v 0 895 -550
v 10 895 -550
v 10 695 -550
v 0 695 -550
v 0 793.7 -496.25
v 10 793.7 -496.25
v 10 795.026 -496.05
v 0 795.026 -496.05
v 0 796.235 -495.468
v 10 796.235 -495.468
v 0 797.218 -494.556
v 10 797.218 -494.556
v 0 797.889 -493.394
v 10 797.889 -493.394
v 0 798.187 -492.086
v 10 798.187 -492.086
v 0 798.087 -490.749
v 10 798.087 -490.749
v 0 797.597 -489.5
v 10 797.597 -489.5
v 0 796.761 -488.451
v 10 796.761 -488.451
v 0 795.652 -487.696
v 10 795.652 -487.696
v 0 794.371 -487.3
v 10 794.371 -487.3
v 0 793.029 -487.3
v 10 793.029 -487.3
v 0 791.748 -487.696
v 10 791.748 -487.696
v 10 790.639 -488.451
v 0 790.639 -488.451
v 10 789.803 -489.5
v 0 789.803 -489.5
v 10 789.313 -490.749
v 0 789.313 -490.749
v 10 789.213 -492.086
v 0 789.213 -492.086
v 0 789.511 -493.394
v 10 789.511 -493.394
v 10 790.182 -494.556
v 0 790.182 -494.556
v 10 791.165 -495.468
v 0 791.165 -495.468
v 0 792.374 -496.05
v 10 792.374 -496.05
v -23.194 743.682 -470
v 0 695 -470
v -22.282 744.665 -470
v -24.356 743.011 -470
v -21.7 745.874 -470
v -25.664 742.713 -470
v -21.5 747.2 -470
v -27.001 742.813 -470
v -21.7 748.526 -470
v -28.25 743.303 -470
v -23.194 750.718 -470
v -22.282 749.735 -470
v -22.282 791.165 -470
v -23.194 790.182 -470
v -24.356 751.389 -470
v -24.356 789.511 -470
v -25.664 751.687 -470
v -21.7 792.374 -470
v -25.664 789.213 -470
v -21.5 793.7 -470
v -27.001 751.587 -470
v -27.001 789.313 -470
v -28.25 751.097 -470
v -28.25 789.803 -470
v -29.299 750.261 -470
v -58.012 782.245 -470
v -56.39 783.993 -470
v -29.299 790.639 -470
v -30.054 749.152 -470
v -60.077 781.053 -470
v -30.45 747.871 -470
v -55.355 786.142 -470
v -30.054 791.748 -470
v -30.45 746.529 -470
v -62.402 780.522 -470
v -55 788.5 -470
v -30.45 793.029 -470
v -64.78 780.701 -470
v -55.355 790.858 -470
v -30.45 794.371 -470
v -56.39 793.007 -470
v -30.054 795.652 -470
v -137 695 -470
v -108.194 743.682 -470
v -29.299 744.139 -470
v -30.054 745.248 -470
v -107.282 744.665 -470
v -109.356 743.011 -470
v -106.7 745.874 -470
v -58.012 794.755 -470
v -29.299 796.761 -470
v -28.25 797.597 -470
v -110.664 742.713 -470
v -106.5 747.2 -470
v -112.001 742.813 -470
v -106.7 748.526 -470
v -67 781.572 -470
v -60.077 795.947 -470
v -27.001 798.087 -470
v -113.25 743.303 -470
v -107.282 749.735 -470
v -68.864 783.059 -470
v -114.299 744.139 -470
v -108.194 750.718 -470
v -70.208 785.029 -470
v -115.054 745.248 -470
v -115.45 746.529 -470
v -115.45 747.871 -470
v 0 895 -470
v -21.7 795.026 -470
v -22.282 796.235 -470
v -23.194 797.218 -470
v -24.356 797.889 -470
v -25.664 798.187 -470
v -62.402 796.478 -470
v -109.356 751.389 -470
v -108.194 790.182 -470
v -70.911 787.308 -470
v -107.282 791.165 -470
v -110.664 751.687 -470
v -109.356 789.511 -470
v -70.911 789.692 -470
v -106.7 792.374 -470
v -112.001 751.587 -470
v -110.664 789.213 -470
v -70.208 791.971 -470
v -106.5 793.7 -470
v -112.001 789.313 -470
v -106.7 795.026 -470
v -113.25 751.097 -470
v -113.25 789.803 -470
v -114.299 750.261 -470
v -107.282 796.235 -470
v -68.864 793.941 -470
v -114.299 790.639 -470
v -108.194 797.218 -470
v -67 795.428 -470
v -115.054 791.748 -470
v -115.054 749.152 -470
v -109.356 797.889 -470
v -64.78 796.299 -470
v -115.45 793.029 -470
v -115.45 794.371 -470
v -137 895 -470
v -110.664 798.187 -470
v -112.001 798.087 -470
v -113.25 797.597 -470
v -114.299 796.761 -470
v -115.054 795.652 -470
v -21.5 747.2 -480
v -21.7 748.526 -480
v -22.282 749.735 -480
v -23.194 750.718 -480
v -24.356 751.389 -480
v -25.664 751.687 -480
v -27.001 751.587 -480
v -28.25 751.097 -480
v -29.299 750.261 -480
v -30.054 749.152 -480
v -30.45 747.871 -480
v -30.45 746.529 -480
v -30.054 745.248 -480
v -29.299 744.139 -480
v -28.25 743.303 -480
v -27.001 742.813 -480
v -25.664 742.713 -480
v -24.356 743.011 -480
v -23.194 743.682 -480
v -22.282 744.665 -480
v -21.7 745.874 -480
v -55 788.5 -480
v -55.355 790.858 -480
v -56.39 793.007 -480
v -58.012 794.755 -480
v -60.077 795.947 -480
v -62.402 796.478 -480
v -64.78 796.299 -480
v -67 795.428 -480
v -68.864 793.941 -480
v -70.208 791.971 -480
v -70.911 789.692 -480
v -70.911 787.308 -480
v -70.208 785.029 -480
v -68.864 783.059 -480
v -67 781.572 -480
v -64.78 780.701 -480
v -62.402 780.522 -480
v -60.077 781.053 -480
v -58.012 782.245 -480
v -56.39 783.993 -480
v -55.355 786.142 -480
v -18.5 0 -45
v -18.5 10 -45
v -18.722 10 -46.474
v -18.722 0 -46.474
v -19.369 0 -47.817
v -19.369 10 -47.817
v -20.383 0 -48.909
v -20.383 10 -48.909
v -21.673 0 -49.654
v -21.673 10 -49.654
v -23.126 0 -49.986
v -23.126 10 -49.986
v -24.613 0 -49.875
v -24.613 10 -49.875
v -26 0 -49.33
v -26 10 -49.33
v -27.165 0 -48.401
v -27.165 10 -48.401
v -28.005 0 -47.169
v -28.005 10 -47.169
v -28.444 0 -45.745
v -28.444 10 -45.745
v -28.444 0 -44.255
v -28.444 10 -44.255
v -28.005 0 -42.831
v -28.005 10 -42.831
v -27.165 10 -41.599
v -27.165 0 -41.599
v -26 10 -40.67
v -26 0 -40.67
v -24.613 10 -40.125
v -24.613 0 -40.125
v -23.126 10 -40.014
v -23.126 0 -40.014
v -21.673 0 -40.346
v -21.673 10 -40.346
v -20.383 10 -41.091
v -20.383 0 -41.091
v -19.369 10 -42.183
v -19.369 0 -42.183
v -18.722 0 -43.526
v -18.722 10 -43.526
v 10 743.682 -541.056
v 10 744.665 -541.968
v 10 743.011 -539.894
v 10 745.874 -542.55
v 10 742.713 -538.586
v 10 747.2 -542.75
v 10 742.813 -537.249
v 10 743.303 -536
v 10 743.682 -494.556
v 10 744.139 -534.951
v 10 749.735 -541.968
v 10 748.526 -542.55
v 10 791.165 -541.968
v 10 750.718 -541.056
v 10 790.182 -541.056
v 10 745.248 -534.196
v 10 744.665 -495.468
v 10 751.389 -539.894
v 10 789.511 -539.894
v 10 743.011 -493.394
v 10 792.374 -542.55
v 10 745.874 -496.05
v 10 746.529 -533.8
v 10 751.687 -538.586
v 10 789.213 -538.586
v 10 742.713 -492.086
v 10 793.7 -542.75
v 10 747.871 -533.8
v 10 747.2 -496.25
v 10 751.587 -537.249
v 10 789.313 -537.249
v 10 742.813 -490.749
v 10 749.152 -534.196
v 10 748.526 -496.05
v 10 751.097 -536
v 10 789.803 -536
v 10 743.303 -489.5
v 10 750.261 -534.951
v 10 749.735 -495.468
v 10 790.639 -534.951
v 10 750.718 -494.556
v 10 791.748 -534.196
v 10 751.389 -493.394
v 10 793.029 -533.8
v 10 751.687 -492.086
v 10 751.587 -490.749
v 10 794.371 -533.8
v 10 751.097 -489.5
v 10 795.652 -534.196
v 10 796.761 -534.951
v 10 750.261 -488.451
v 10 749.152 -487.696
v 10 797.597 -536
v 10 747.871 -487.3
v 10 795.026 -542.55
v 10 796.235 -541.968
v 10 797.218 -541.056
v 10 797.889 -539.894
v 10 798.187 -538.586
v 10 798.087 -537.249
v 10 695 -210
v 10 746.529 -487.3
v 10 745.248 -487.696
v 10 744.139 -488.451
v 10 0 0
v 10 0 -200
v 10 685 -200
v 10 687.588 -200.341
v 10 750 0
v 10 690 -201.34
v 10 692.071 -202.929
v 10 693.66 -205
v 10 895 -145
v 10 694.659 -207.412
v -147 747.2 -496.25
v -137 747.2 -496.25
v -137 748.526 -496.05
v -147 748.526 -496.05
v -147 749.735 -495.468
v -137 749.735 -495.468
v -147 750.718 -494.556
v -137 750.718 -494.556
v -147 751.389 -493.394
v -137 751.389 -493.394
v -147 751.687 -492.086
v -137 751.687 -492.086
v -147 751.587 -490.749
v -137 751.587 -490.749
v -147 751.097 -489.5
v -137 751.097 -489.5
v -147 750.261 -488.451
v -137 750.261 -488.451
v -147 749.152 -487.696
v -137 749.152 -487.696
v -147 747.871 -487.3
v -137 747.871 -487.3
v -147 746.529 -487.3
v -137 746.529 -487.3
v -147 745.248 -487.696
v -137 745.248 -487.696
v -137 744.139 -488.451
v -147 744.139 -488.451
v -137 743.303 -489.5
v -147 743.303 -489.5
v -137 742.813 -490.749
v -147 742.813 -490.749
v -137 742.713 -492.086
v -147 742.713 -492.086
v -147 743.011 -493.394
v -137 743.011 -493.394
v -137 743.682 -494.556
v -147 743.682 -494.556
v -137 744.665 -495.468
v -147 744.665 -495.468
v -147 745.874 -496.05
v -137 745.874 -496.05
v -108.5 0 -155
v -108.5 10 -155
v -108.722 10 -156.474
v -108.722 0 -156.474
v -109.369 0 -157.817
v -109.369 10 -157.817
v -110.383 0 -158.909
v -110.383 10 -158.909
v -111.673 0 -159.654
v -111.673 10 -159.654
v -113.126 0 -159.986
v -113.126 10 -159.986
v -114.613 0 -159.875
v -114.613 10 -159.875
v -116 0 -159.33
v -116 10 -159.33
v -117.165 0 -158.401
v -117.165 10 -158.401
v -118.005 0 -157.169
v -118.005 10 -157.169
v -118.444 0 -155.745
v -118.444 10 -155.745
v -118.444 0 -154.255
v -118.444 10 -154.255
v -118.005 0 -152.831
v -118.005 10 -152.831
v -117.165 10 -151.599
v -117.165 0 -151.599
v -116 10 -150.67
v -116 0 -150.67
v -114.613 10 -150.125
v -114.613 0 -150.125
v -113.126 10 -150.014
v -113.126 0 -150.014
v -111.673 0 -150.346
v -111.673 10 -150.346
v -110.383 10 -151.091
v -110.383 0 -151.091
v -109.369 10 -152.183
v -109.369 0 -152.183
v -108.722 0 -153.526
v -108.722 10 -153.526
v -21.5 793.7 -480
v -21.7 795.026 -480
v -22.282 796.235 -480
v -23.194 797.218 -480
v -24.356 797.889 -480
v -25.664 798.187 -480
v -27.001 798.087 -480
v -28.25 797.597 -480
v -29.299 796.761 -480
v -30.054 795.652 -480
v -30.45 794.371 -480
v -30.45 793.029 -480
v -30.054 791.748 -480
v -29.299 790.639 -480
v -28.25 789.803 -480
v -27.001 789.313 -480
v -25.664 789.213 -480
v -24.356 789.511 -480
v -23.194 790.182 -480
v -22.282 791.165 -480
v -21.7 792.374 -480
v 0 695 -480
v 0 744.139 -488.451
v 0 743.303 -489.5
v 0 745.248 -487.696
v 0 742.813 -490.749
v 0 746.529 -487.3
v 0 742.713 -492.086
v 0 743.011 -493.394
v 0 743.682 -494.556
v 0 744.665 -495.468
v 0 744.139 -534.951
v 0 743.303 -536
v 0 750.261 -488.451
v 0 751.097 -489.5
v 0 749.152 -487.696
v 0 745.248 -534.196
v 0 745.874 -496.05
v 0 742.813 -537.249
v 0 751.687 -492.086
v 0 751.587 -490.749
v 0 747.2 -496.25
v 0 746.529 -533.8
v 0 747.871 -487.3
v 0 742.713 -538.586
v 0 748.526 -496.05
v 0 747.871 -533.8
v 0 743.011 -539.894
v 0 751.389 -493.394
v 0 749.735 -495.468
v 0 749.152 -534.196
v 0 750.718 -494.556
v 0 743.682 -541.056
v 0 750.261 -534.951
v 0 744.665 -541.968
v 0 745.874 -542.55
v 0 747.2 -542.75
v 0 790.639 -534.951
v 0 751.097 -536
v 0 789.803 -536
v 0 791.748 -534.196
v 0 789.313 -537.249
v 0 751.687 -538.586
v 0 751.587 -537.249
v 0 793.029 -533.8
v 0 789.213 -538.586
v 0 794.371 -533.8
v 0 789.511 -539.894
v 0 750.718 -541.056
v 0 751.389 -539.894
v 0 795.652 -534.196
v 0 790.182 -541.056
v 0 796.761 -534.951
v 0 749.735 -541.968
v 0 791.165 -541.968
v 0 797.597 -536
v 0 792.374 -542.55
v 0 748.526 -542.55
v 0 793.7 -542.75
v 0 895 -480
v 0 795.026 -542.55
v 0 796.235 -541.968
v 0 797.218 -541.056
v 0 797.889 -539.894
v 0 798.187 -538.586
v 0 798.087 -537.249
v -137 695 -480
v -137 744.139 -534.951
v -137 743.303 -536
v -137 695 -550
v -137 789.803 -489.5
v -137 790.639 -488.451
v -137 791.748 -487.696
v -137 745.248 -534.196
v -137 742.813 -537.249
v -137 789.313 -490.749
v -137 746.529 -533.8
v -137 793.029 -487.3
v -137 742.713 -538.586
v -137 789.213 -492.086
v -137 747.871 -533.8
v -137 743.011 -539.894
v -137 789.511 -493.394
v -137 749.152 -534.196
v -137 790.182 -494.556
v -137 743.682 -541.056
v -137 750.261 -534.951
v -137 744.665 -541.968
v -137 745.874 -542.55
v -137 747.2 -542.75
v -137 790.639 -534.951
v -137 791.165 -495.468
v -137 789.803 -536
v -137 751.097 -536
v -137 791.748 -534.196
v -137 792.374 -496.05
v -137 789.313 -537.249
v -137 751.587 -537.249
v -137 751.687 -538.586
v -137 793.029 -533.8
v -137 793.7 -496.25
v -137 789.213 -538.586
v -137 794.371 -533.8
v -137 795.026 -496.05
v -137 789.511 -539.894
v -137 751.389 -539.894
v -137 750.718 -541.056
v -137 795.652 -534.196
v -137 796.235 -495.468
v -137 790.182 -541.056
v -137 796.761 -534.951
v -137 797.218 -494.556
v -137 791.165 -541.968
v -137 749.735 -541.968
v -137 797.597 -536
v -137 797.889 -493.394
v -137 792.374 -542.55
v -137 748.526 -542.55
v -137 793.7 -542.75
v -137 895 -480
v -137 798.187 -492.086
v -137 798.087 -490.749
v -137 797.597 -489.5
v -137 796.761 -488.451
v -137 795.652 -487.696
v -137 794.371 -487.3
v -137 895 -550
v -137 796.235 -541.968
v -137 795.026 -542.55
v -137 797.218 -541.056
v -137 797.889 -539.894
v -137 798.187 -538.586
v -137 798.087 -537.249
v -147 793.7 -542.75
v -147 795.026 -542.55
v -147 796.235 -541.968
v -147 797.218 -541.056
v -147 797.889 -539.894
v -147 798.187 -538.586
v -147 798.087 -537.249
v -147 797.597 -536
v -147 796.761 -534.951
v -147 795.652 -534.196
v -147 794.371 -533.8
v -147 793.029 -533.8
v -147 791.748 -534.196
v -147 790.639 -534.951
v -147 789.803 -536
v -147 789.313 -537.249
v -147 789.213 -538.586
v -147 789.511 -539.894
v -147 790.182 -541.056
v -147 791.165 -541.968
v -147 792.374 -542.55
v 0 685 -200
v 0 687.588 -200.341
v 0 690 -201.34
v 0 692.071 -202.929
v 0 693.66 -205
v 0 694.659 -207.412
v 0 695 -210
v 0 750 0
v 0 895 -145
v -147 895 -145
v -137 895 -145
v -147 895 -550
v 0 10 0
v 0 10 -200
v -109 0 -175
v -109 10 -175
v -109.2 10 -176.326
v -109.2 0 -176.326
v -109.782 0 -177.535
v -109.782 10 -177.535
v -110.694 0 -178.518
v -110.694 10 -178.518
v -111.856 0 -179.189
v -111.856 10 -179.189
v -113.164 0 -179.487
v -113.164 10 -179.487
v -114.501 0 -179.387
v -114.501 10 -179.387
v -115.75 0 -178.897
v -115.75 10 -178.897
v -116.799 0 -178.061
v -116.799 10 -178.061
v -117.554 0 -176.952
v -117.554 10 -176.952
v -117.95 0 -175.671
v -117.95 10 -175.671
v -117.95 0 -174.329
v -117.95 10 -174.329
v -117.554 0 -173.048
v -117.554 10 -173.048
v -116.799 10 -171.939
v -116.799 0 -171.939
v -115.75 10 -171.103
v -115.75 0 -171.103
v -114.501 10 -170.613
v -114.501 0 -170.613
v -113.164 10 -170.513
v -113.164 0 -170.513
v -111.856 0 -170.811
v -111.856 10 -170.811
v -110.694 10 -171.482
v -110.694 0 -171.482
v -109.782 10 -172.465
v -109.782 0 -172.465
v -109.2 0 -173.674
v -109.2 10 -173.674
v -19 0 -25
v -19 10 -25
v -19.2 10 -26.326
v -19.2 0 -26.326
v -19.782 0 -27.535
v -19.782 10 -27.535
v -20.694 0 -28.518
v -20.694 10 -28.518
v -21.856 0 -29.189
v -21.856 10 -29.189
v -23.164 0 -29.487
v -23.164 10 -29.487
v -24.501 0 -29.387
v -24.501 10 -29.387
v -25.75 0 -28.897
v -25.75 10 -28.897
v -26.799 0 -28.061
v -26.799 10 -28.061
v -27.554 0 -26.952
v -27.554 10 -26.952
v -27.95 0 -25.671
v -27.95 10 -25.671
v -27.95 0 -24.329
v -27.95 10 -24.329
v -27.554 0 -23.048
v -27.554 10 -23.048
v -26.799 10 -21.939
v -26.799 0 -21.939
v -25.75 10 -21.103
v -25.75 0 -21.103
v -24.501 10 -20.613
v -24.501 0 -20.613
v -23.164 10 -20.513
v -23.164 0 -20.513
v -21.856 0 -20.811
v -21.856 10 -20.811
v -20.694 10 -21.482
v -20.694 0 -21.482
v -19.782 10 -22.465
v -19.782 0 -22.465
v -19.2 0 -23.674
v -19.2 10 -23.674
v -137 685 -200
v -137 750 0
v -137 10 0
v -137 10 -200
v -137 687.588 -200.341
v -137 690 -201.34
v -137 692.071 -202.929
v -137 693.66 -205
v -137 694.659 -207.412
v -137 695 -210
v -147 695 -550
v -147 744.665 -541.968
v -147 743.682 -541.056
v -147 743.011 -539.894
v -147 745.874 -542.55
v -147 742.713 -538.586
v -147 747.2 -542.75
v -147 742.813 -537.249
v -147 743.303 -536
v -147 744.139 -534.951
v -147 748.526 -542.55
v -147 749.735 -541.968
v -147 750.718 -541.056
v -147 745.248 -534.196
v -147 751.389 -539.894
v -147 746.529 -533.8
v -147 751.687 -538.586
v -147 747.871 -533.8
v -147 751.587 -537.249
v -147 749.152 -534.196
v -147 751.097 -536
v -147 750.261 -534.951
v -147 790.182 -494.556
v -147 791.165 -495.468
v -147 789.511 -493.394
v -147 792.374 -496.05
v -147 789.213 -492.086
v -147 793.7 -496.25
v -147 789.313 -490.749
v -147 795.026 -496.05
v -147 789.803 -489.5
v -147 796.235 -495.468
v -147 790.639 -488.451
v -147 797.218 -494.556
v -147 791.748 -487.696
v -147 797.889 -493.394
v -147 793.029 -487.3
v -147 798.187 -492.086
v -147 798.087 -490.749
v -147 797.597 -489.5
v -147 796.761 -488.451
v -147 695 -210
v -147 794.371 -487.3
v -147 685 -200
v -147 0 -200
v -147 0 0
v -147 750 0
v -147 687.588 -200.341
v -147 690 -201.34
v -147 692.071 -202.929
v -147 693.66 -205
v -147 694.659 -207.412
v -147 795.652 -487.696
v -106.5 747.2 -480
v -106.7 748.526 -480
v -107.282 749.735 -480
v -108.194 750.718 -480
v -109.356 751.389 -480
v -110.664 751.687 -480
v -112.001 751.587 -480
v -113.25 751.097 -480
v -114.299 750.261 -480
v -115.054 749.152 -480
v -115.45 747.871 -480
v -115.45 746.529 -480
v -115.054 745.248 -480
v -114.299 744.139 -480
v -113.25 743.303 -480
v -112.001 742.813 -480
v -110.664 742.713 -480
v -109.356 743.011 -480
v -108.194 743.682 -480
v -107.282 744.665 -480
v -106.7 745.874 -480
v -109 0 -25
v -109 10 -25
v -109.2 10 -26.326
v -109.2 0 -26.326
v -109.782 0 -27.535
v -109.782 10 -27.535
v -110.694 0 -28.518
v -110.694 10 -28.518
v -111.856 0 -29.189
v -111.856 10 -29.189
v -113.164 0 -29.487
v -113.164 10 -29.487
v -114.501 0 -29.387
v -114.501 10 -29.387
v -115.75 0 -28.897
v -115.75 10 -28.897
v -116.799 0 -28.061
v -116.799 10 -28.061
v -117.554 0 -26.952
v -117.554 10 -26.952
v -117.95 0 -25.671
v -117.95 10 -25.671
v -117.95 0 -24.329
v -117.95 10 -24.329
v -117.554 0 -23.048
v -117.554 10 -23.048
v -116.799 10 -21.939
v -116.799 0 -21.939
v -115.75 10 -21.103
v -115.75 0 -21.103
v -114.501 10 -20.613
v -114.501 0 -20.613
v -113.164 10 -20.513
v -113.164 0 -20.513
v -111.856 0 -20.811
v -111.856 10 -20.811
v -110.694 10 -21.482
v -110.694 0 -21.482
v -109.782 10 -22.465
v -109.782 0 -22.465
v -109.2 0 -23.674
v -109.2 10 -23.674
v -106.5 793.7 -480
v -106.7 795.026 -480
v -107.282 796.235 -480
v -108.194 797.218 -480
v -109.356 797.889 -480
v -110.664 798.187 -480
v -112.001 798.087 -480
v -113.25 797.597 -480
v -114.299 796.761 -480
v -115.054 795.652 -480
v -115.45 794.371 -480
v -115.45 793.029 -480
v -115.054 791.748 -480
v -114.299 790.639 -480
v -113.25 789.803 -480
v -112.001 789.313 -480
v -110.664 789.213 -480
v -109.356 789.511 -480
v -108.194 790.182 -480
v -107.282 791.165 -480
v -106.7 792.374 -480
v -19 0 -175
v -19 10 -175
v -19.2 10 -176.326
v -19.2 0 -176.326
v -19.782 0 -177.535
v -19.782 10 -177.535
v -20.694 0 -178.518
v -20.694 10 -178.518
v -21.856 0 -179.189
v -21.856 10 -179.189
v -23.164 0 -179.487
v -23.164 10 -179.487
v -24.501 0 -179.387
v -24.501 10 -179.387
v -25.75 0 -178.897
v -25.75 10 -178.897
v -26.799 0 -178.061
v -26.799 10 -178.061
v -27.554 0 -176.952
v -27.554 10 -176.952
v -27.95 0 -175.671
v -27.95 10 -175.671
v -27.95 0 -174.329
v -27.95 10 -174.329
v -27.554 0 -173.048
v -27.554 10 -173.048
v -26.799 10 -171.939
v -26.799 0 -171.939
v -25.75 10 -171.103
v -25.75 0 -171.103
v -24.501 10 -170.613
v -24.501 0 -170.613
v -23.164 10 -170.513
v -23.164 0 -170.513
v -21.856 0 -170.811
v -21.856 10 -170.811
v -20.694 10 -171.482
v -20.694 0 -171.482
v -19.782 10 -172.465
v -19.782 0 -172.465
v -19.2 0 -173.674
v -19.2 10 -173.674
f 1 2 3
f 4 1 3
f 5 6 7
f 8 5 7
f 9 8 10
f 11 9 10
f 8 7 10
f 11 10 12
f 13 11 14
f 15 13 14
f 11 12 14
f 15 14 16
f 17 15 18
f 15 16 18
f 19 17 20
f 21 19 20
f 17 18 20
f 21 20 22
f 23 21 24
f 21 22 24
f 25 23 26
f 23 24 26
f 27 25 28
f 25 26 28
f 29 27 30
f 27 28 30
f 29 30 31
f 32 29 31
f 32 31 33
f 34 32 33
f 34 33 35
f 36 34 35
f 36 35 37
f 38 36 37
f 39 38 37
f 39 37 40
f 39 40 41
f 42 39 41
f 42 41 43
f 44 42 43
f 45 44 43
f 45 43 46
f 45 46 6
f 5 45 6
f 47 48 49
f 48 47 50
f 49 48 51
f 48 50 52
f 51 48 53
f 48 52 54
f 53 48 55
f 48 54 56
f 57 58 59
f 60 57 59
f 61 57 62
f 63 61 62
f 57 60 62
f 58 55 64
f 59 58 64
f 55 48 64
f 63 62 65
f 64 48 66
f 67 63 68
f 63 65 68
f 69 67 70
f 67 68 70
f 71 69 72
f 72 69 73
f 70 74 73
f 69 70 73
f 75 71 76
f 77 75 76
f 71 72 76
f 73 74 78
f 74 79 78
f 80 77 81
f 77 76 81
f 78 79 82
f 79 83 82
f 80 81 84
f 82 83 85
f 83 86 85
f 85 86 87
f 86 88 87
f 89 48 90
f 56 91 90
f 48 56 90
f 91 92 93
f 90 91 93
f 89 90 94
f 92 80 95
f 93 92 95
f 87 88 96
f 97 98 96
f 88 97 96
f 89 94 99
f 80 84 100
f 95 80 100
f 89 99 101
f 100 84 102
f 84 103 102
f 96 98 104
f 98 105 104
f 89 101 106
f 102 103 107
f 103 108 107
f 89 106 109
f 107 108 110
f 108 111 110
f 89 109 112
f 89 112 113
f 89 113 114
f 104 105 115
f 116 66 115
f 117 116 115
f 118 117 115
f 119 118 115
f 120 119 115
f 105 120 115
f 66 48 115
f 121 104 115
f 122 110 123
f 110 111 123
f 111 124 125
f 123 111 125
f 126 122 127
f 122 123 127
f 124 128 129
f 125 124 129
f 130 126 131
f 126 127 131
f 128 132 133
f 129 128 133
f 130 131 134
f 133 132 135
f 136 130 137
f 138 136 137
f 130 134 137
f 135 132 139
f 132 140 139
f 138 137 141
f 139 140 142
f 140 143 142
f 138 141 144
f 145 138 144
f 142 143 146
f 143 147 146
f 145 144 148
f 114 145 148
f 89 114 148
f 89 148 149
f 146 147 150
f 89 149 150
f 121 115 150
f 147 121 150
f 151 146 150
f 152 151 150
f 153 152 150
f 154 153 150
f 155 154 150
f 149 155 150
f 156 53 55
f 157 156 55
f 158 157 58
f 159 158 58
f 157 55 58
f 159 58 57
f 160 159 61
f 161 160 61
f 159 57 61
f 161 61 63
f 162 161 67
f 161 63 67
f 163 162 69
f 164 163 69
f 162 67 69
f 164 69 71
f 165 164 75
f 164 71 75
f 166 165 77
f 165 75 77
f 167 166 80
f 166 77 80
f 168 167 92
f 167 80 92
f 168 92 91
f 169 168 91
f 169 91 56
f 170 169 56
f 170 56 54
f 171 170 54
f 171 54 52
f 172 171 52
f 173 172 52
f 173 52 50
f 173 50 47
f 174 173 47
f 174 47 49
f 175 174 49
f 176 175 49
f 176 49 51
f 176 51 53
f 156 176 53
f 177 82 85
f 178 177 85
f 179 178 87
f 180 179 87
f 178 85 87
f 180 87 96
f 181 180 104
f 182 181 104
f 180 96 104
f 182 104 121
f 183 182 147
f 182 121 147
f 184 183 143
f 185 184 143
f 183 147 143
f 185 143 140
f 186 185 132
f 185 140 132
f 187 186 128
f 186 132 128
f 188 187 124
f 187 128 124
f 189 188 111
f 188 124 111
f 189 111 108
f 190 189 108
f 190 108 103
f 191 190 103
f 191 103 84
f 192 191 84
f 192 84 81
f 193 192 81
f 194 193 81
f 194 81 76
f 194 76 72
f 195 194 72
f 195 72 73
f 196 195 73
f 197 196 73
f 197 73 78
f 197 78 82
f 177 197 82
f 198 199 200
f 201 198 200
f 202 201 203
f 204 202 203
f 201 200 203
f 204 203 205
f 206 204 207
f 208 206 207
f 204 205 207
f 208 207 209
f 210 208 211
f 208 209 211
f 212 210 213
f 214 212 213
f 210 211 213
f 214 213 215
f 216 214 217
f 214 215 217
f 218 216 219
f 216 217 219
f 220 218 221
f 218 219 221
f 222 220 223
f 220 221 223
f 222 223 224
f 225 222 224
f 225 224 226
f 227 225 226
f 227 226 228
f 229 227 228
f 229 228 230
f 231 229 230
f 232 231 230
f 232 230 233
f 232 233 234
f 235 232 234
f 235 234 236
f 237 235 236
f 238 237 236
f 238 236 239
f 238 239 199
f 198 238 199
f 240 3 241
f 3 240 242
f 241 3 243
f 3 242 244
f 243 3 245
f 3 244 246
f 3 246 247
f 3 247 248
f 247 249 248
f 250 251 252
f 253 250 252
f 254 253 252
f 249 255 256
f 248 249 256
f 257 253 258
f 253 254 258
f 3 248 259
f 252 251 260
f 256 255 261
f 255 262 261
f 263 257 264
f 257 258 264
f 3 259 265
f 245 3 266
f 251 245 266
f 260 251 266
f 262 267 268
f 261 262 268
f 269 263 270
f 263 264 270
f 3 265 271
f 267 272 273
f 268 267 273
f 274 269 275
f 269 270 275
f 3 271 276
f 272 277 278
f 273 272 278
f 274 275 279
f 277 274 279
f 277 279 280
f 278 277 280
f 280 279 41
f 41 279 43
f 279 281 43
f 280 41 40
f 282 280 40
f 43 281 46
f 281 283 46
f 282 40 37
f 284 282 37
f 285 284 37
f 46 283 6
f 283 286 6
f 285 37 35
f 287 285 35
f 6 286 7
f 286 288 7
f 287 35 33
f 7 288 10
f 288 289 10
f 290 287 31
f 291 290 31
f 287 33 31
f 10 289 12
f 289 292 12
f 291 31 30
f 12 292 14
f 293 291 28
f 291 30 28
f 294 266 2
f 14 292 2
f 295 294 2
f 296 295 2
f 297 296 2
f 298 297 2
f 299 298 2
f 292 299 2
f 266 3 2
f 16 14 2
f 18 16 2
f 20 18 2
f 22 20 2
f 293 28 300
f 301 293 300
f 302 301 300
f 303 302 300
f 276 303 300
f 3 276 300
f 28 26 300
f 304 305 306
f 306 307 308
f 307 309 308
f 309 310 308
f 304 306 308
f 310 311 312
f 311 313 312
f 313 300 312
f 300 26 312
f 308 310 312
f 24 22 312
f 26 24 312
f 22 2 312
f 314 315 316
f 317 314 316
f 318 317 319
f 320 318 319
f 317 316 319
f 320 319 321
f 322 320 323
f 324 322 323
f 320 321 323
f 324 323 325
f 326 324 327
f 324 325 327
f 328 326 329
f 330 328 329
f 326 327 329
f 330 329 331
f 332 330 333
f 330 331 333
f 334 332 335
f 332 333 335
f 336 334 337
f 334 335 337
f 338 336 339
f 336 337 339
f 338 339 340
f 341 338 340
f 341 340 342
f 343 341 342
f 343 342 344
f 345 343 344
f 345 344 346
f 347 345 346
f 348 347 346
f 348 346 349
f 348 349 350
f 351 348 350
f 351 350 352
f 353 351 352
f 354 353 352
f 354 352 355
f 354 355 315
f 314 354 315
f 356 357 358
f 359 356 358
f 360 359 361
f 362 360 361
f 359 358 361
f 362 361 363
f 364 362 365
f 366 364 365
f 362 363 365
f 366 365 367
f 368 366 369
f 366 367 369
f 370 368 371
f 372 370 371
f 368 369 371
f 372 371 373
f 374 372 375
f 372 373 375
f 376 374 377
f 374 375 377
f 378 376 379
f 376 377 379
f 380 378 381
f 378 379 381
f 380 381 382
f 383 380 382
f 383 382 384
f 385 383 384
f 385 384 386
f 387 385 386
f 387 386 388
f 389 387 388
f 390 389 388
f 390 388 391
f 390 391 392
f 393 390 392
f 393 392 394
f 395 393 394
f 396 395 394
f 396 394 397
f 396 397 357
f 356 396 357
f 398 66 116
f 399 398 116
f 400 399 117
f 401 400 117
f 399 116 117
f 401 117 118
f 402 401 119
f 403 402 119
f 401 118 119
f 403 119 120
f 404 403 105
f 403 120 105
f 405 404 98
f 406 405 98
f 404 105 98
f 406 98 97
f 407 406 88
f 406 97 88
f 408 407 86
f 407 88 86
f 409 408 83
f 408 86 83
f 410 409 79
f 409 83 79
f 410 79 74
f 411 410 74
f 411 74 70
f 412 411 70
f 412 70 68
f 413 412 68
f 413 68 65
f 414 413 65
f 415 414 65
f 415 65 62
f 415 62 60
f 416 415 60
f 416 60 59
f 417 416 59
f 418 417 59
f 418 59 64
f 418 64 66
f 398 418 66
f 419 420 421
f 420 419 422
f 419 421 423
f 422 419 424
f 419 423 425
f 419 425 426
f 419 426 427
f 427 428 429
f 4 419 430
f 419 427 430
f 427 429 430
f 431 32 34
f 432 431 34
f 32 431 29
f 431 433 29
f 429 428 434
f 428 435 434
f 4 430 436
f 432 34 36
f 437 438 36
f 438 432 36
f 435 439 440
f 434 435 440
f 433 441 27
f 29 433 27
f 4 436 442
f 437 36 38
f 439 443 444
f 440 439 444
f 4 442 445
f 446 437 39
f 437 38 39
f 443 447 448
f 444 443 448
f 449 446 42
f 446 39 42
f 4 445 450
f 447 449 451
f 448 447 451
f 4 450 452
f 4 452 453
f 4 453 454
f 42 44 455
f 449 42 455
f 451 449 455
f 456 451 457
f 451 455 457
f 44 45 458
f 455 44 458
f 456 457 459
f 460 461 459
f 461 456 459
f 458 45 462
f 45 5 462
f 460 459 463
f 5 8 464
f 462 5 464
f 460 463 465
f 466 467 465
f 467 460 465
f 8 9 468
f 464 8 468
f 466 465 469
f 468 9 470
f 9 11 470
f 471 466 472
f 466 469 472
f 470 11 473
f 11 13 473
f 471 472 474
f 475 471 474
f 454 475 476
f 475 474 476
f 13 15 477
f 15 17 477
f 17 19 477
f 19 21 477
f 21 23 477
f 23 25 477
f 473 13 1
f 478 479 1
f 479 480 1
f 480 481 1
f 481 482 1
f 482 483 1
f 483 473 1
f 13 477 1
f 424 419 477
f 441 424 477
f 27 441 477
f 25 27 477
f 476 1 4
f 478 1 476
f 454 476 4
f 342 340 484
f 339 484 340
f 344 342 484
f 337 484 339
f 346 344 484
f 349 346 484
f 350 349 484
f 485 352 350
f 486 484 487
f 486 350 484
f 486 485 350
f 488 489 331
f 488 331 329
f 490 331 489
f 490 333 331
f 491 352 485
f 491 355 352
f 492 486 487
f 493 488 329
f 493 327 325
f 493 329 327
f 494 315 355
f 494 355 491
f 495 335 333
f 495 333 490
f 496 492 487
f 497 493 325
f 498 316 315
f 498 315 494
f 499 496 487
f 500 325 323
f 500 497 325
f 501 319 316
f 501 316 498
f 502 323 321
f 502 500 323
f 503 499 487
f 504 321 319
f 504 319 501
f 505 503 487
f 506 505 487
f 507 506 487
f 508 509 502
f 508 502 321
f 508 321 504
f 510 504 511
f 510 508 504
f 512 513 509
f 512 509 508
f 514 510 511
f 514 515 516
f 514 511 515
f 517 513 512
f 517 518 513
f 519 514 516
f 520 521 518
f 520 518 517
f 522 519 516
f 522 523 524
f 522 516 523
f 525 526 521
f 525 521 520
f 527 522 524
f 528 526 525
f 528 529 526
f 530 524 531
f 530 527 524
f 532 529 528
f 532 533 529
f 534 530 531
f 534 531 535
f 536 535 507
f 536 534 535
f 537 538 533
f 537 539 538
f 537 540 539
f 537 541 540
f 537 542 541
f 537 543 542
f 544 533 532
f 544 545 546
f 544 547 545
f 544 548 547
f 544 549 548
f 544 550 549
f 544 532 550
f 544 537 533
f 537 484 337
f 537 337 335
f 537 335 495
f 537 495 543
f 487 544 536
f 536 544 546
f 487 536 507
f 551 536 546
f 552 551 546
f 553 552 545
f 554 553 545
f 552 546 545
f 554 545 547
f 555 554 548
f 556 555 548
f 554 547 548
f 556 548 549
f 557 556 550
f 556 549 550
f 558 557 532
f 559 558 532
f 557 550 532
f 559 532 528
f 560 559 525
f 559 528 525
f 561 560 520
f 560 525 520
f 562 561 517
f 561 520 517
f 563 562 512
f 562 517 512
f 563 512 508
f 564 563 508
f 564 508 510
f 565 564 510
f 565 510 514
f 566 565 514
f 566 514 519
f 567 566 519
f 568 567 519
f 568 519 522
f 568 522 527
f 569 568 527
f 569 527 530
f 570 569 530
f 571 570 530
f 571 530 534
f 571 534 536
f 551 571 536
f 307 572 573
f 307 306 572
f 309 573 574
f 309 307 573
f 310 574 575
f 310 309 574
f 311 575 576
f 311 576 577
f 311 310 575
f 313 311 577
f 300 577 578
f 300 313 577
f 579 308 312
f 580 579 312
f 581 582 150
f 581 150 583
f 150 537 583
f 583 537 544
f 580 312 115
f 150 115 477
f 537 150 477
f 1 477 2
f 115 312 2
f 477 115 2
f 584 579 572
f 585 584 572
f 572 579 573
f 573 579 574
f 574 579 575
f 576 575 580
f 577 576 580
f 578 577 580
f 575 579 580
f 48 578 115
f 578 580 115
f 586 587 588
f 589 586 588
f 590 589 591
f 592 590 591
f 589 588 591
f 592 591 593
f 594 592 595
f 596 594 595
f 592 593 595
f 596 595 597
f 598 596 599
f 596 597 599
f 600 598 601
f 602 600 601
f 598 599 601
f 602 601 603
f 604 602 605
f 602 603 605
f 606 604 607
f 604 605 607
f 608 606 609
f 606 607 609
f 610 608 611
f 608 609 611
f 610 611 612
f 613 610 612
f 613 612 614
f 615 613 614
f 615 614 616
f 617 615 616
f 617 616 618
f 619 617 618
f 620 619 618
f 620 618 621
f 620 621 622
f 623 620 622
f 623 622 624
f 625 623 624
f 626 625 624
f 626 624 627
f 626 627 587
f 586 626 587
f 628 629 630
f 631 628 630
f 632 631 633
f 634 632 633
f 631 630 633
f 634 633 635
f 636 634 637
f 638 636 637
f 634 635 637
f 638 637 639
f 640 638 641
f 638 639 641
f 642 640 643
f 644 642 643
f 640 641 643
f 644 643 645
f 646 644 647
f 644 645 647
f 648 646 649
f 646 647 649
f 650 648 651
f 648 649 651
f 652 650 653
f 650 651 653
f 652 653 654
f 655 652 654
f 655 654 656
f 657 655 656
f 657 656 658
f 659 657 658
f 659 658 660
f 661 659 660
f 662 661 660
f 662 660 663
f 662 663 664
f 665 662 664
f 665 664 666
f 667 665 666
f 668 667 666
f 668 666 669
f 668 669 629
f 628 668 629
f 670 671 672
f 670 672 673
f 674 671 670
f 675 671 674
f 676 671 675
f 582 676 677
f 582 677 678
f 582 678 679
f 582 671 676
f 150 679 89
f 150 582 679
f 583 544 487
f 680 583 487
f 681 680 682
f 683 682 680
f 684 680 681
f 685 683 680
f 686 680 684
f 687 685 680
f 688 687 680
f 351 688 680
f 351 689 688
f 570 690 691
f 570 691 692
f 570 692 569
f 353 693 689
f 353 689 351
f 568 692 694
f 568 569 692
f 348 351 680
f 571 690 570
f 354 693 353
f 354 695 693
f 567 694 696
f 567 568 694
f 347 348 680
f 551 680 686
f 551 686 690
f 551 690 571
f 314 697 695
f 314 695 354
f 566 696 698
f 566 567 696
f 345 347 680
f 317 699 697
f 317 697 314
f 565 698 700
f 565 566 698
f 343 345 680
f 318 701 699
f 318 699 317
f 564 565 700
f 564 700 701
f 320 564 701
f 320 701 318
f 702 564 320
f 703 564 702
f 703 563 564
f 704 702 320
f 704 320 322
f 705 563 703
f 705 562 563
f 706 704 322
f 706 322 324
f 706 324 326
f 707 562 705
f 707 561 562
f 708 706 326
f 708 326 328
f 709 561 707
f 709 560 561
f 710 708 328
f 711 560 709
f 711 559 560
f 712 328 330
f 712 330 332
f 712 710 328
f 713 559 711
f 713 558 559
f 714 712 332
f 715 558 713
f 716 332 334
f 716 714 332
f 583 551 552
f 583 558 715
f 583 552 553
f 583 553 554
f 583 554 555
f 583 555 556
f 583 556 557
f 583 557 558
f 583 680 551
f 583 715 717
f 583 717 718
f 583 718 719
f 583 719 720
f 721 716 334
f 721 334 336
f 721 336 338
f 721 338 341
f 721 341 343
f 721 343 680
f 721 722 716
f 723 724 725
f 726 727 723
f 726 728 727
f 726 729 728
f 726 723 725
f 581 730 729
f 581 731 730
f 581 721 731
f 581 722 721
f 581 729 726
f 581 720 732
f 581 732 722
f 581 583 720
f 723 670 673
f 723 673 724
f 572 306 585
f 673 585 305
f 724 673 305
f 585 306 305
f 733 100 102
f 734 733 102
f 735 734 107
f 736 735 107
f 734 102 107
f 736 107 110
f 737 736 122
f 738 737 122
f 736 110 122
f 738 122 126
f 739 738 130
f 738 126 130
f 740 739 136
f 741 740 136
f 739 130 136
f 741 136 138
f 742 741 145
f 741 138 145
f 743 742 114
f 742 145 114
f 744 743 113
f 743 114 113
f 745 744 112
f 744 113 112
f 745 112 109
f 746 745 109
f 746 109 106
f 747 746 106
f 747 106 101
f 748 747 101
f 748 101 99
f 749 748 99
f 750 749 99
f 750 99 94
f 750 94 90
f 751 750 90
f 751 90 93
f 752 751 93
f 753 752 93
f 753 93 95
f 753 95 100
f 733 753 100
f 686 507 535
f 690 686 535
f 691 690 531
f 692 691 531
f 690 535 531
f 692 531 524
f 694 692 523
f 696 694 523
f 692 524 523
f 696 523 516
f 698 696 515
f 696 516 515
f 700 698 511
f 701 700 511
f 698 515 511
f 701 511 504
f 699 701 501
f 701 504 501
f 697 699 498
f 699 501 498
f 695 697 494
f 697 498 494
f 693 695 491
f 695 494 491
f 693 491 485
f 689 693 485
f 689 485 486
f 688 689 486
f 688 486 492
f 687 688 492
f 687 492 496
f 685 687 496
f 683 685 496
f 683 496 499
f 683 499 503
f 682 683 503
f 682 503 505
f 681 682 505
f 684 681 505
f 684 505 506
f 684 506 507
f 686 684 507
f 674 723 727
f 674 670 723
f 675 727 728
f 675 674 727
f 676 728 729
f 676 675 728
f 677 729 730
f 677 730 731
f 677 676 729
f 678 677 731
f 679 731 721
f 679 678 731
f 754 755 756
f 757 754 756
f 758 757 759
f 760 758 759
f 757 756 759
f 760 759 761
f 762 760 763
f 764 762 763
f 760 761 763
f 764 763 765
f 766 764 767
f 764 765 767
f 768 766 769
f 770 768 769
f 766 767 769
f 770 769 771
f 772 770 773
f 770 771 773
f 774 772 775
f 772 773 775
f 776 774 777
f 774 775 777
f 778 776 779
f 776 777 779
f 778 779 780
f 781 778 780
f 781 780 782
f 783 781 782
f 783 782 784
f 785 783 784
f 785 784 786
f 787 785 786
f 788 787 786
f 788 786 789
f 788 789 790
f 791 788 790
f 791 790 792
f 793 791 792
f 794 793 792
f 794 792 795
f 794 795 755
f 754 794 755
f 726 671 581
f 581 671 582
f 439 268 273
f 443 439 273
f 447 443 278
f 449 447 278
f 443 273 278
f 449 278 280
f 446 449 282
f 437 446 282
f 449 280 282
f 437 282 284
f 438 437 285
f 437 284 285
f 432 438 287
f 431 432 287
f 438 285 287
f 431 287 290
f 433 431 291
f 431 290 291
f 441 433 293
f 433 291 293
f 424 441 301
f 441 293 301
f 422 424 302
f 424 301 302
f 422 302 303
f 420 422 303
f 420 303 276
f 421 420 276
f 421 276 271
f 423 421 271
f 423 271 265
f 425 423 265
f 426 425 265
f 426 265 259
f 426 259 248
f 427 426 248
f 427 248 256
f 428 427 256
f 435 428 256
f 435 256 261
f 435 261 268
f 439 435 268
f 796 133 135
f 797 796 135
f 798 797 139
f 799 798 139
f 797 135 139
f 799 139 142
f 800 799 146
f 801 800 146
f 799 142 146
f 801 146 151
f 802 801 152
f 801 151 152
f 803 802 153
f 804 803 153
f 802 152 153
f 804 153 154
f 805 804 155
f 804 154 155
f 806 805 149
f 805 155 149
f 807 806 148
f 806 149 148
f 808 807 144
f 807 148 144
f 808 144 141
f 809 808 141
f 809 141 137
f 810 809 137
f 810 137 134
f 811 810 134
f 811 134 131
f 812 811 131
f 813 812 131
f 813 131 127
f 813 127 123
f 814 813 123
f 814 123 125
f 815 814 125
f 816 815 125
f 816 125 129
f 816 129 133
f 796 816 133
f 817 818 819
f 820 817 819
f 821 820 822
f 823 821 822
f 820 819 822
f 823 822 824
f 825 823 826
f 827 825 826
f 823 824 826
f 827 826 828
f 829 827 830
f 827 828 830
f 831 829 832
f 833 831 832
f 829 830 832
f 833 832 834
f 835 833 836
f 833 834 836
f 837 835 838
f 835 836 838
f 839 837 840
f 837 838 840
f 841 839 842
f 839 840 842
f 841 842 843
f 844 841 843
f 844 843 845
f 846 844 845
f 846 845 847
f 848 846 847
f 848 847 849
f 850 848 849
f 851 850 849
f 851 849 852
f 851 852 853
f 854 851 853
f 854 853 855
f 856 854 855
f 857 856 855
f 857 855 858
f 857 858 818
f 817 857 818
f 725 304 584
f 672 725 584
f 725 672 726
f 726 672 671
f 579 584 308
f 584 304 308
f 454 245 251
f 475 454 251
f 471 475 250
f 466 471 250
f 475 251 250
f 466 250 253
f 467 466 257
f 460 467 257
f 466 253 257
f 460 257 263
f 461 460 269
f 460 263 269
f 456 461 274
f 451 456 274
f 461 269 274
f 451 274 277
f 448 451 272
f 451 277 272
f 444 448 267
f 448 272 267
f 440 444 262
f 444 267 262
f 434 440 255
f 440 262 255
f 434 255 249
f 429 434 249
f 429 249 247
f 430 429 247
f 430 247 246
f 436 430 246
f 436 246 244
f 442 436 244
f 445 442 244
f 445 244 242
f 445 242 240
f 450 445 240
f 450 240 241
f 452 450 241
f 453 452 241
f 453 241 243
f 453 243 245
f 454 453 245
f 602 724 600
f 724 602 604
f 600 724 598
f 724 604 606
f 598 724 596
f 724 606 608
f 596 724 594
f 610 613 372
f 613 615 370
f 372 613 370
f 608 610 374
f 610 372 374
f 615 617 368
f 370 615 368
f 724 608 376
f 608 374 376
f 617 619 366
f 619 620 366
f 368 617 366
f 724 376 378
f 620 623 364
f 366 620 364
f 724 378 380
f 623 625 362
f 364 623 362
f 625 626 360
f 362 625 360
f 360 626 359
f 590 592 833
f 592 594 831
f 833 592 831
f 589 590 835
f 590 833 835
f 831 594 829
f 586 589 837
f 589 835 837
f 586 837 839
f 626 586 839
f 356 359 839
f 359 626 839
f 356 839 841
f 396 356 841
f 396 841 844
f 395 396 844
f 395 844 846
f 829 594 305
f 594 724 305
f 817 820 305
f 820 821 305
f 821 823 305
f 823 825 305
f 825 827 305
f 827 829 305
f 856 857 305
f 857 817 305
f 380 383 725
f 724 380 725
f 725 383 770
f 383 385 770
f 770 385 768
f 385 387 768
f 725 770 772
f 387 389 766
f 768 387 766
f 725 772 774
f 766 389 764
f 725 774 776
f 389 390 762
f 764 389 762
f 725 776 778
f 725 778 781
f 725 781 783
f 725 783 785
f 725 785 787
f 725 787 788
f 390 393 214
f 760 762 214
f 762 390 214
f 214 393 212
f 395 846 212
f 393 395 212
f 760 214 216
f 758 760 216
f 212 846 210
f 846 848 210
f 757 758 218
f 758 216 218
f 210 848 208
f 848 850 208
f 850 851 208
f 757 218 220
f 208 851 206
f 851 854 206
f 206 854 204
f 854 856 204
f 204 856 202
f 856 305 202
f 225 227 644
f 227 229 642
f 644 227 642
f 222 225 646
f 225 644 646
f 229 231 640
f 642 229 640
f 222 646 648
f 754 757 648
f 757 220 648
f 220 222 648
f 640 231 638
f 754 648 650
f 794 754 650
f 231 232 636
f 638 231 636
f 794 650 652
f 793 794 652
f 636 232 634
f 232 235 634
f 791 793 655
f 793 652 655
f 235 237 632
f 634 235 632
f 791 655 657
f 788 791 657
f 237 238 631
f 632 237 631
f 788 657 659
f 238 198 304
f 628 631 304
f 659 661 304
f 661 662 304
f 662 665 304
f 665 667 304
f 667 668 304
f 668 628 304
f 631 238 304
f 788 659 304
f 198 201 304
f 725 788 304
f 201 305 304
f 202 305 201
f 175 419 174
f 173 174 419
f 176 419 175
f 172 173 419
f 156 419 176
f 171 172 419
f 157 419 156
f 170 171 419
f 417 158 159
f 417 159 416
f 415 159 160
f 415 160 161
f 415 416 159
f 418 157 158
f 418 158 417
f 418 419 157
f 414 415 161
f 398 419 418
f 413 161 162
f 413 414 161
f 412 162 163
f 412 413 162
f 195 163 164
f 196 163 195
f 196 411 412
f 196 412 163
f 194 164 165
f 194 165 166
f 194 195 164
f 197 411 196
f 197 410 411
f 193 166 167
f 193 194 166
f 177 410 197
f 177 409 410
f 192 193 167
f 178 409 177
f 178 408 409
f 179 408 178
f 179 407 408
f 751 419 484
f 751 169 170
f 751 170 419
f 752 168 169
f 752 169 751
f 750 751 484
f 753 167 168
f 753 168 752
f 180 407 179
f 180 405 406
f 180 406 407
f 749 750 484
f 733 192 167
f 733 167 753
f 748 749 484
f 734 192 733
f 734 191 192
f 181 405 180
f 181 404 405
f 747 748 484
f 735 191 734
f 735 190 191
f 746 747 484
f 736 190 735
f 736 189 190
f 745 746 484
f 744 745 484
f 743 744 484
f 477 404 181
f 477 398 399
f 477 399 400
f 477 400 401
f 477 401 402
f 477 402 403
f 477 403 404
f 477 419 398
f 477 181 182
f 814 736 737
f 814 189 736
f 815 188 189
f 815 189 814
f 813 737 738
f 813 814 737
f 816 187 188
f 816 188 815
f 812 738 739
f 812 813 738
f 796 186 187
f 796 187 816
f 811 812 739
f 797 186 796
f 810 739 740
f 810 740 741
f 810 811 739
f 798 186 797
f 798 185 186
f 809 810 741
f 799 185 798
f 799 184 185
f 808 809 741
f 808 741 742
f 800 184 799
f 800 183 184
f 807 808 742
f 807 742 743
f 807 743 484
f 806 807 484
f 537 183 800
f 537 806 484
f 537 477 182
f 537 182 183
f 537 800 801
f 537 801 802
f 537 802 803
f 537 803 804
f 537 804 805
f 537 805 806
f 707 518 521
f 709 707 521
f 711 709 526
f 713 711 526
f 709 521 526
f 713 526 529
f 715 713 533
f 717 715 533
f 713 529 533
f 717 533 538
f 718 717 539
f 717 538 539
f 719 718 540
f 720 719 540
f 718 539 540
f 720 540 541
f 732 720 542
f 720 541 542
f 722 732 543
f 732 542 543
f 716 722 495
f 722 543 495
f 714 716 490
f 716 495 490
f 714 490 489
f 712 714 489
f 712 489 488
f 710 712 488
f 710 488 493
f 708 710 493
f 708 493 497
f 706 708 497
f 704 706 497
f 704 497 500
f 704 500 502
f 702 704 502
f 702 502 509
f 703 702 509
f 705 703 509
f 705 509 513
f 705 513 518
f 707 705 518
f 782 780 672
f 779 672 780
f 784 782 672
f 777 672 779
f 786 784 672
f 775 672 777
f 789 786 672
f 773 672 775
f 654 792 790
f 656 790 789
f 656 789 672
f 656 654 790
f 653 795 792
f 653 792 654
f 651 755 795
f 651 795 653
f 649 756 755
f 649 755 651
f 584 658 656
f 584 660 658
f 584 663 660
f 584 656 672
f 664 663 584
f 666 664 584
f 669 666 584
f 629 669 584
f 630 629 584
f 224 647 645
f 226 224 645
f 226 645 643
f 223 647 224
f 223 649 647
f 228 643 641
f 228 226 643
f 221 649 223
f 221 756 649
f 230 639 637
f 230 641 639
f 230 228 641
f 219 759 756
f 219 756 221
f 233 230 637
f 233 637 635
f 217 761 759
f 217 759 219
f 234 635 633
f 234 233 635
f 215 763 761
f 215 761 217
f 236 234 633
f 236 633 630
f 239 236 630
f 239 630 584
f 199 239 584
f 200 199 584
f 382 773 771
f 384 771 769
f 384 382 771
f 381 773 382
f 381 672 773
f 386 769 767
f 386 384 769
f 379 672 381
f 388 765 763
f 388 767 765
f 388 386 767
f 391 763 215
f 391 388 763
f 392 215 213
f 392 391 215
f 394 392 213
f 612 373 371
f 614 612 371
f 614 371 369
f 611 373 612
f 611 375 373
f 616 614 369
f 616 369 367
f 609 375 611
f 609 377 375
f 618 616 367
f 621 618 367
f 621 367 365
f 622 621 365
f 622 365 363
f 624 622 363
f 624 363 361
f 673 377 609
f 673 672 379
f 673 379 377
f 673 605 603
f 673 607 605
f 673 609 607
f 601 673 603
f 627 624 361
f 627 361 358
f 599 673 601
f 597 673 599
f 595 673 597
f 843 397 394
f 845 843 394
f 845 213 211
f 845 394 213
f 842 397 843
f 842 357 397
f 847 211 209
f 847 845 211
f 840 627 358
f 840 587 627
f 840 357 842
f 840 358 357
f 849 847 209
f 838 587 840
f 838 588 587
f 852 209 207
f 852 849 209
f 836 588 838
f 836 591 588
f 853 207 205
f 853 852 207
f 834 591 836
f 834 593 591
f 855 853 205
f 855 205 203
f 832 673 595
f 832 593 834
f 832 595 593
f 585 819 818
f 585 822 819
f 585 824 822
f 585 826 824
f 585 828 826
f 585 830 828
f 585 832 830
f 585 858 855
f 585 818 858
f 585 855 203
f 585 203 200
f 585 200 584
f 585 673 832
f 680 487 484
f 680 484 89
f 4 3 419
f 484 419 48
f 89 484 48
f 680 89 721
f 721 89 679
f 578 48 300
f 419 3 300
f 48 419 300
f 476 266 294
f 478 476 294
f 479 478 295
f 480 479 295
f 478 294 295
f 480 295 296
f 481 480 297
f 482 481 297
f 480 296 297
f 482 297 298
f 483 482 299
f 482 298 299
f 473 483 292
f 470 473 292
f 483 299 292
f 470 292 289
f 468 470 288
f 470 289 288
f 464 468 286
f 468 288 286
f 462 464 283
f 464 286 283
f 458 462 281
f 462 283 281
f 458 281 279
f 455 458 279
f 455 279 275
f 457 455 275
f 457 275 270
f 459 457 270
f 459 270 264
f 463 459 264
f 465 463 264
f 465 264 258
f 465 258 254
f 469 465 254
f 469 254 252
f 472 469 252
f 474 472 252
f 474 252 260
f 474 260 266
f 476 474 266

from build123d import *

# Parameters (mm, degrees)
BOSS_EXTRUDE1_DEPTH      = 10
BOSS_EXTRUDE1_DEPTH_BACK = 147
SKETCH3_W                = 137
SKETCH3_H                = 550
CUT_EXTRUDE1_DEPTH       = 885
SKETCH4_W                = 137
SKETCH4_H                = 200
BOSS_EXTRUDE2_DEPTH      = 10
SKETCH5_R                = 4.5
CUT_EXTRUDE2_DEPTH       = 158
CUT_EXTRUDE3_REACH       = 82
SKETCH6_R                = 4.5
SKETCH6_R_2              = 8
CUT_EXTRUDE4_REACH       = 12
SKETCH7_R                = 4.5
SKETCH7_R_2              = 5
FILLET1_R                = 10


with BuildPart() as part:
    # Sketch1 → Boss-Extrude1 (new body, two sides)
    with BuildSketch(Plane(origin=(0, 0, 0), x_dir=(0, 0, -1), z_dir=(1, 0, 0))) as boss_extrude1_sk:
        Polygon((0, 0), (0, 750), (145, 895), (550, 895), (550, 695), (200, 695), (200, 0), align=None)
    extrude(amount=BOSS_EXTRUDE1_DEPTH)
    extrude(boss_extrude1_sk.sketch, amount=-BOSS_EXTRUDE1_DEPTH_BACK)

    # Sketch3 → Cut-Extrude1 (cut)
    with BuildSketch(Plane(origin=(0, 895, 0), x_dir=(1, 0, 0), z_dir=(0, 1, 0))):
        with Locations((-68.5, 275)):
            Rectangle(SKETCH3_W, SKETCH3_H)
    extrude(amount=-CUT_EXTRUDE1_DEPTH, mode=Mode.SUBTRACT)

    # Sketch4 → Boss-Extrude2 (add)
    with BuildSketch(Plane(origin=(0, 0, -480), x_dir=(-1, 0, 0), z_dir=(0, 0, -1))):
        with Locations((68.5, 795)):
            Rectangle(SKETCH4_W, SKETCH4_H)
    extrude(amount=-BOSS_EXTRUDE2_DEPTH)

    # Sketch5 → Cut-Extrude2 (cut, through all)
    with BuildSketch(Plane(origin=(10, 0, 0), x_dir=(0, 0, -1), z_dir=(1, 0, 0))):
        with Locations((538.25, 747.2)):
            Circle(SKETCH5_R)
        with Locations((538.25, 793.7)):
            Circle(SKETCH5_R)
        with Locations((491.75, 747.2)):
            Circle(SKETCH5_R)
        with Locations((491.75, 793.7)):
            Circle(SKETCH5_R)
    extrude(amount=-CUT_EXTRUDE2_DEPTH, mode=Mode.SUBTRACT)

    # Sketch6 → Cut-Extrude3 (cut, up to next)
    with BuildSketch(Plane.XY.offset(-470), mode=Mode.PRIVATE) as cut_extrude3_sk1:
        with Locations((-111, 747.2)):
            Circle(SKETCH6_R)
    cut_extrude3_tool1 = extrude(cut_extrude3_sk1.sketch, amount=-CUT_EXTRUDE3_REACH, mode=Mode.PRIVATE) & part.part
    add(cut_extrude3_tool1.solids().sort_by_distance((-111, 747.2, -470))[0], mode=Mode.SUBTRACT)
    # Sketch6 → Cut-Extrude3 (cut, up to next)
    with BuildSketch(Plane.XY.offset(-470), mode=Mode.PRIVATE) as cut_extrude3_sk2:
        with Locations((-26, 747.2)):
            Circle(SKETCH6_R)
    cut_extrude3_tool2 = extrude(cut_extrude3_sk2.sketch, amount=-CUT_EXTRUDE3_REACH, mode=Mode.PRIVATE) & part.part
    add(cut_extrude3_tool2.solids().sort_by_distance((-26, 747.2, -470))[0], mode=Mode.SUBTRACT)
    # Sketch6 → Cut-Extrude3 (cut, up to next)
    with BuildSketch(Plane.XY.offset(-470), mode=Mode.PRIVATE) as cut_extrude3_sk3:
        with Locations((-111, 793.7)):
            Circle(SKETCH6_R)
    cut_extrude3_tool3 = extrude(cut_extrude3_sk3.sketch, amount=-CUT_EXTRUDE3_REACH, mode=Mode.PRIVATE) & part.part
    add(cut_extrude3_tool3.solids().sort_by_distance((-111, 793.7, -470))[0], mode=Mode.SUBTRACT)
    # Sketch6 → Cut-Extrude3 (cut, up to next)
    with BuildSketch(Plane.XY.offset(-470), mode=Mode.PRIVATE) as cut_extrude3_sk4:
        with Locations((-26, 793.7)):
            Circle(SKETCH6_R)
    cut_extrude3_tool4 = extrude(cut_extrude3_sk4.sketch, amount=-CUT_EXTRUDE3_REACH, mode=Mode.PRIVATE) & part.part
    add(cut_extrude3_tool4.solids().sort_by_distance((-26, 793.7, -470))[0], mode=Mode.SUBTRACT)
    # Sketch6 → Cut-Extrude3 (cut, up to next)
    with BuildSketch(Plane.XY.offset(-470), mode=Mode.PRIVATE) as cut_extrude3_sk5:
        with Locations((-63, 788.5)):
            Circle(SKETCH6_R_2)
    cut_extrude3_tool5 = extrude(cut_extrude3_sk5.sketch, amount=-CUT_EXTRUDE3_REACH, mode=Mode.PRIVATE) & part.part
    add(cut_extrude3_tool5.solids().sort_by_distance((-63, 788.5, -470))[0], mode=Mode.SUBTRACT)

    # Sketch7 → Cut-Extrude4 (cut, up to next)
    with BuildSketch(Plane(origin=(0, 10, 0), x_dir=(1, 0, 0), z_dir=(0, 1, 0)), mode=Mode.PRIVATE) as cut_extrude4_sk1:
        with Locations((-113.5, 175)):
            Circle(SKETCH7_R)
    cut_extrude4_tool1 = extrude(cut_extrude4_sk1.sketch, amount=-CUT_EXTRUDE4_REACH, mode=Mode.PRIVATE) & part.part
    add(cut_extrude4_tool1.solids().sort_by_distance((-113.5, 10, -175))[0], mode=Mode.SUBTRACT)
    # Sketch7 → Cut-Extrude4 (cut, up to next)
    with BuildSketch(Plane(origin=(0, 10, 0), x_dir=(1, 0, 0), z_dir=(0, 1, 0)), mode=Mode.PRIVATE) as cut_extrude4_sk2:
        with Locations((-23.5, 175)):
            Circle(SKETCH7_R)
    cut_extrude4_tool2 = extrude(cut_extrude4_sk2.sketch, amount=-CUT_EXTRUDE4_REACH, mode=Mode.PRIVATE) & part.part
    add(cut_extrude4_tool2.solids().sort_by_distance((-23.5, 10, -175))[0], mode=Mode.SUBTRACT)
    # Sketch7 → Cut-Extrude4 (cut, up to next)
    with BuildSketch(Plane(origin=(0, 10, 0), x_dir=(1, 0, 0), z_dir=(0, 1, 0)), mode=Mode.PRIVATE) as cut_extrude4_sk3:
        with Locations((-23.5, 25)):
            Circle(SKETCH7_R)
    cut_extrude4_tool3 = extrude(cut_extrude4_sk3.sketch, amount=-CUT_EXTRUDE4_REACH, mode=Mode.PRIVATE) & part.part
    add(cut_extrude4_tool3.solids().sort_by_distance((-23.5, 10, -25))[0], mode=Mode.SUBTRACT)
    # Sketch7 → Cut-Extrude4 (cut, up to next)
    with BuildSketch(Plane(origin=(0, 10, 0), x_dir=(1, 0, 0), z_dir=(0, 1, 0)), mode=Mode.PRIVATE) as cut_extrude4_sk4:
        with Locations((-113.5, 25)):
            Circle(SKETCH7_R)
    cut_extrude4_tool4 = extrude(cut_extrude4_sk4.sketch, amount=-CUT_EXTRUDE4_REACH, mode=Mode.PRIVATE) & part.part
    add(cut_extrude4_tool4.solids().sort_by_distance((-113.5, 10, -25))[0], mode=Mode.SUBTRACT)
    # Sketch7 → Cut-Extrude4 (cut, up to next)
    with BuildSketch(Plane(origin=(0, 10, 0), x_dir=(1, 0, 0), z_dir=(0, 1, 0)), mode=Mode.PRIVATE) as cut_extrude4_sk5:
        with Locations((-113.5, 155)):
            Circle(SKETCH7_R_2)
    cut_extrude4_tool5 = extrude(cut_extrude4_sk5.sketch, amount=-CUT_EXTRUDE4_REACH, mode=Mode.PRIVATE) & part.part
    add(cut_extrude4_tool5.solids().sort_by_distance((-113.5, 10, -155))[0], mode=Mode.SUBTRACT)
    # Sketch7 → Cut-Extrude4 (cut, up to next)
    with BuildSketch(Plane(origin=(0, 10, 0), x_dir=(1, 0, 0), z_dir=(0, 1, 0)), mode=Mode.PRIVATE) as cut_extrude4_sk6:
        with Locations((-23.5, 45)):
            Circle(SKETCH7_R_2)
    cut_extrude4_tool6 = extrude(cut_extrude4_sk6.sketch, amount=-CUT_EXTRUDE4_REACH, mode=Mode.PRIVATE) & part.part
    add(cut_extrude4_tool6.solids().sort_by_distance((-23.5, 10, -45))[0], mode=Mode.SUBTRACT)

    # Fillet1
    fillet1_edges = [part.edges().sort_by_distance(p)[0] for p in [
        (-142, 695, -200),
        (5, 695, -200),
    ]]
    fillet(fillet1_edges, radius=FILLET1_R)


solid = part.part
